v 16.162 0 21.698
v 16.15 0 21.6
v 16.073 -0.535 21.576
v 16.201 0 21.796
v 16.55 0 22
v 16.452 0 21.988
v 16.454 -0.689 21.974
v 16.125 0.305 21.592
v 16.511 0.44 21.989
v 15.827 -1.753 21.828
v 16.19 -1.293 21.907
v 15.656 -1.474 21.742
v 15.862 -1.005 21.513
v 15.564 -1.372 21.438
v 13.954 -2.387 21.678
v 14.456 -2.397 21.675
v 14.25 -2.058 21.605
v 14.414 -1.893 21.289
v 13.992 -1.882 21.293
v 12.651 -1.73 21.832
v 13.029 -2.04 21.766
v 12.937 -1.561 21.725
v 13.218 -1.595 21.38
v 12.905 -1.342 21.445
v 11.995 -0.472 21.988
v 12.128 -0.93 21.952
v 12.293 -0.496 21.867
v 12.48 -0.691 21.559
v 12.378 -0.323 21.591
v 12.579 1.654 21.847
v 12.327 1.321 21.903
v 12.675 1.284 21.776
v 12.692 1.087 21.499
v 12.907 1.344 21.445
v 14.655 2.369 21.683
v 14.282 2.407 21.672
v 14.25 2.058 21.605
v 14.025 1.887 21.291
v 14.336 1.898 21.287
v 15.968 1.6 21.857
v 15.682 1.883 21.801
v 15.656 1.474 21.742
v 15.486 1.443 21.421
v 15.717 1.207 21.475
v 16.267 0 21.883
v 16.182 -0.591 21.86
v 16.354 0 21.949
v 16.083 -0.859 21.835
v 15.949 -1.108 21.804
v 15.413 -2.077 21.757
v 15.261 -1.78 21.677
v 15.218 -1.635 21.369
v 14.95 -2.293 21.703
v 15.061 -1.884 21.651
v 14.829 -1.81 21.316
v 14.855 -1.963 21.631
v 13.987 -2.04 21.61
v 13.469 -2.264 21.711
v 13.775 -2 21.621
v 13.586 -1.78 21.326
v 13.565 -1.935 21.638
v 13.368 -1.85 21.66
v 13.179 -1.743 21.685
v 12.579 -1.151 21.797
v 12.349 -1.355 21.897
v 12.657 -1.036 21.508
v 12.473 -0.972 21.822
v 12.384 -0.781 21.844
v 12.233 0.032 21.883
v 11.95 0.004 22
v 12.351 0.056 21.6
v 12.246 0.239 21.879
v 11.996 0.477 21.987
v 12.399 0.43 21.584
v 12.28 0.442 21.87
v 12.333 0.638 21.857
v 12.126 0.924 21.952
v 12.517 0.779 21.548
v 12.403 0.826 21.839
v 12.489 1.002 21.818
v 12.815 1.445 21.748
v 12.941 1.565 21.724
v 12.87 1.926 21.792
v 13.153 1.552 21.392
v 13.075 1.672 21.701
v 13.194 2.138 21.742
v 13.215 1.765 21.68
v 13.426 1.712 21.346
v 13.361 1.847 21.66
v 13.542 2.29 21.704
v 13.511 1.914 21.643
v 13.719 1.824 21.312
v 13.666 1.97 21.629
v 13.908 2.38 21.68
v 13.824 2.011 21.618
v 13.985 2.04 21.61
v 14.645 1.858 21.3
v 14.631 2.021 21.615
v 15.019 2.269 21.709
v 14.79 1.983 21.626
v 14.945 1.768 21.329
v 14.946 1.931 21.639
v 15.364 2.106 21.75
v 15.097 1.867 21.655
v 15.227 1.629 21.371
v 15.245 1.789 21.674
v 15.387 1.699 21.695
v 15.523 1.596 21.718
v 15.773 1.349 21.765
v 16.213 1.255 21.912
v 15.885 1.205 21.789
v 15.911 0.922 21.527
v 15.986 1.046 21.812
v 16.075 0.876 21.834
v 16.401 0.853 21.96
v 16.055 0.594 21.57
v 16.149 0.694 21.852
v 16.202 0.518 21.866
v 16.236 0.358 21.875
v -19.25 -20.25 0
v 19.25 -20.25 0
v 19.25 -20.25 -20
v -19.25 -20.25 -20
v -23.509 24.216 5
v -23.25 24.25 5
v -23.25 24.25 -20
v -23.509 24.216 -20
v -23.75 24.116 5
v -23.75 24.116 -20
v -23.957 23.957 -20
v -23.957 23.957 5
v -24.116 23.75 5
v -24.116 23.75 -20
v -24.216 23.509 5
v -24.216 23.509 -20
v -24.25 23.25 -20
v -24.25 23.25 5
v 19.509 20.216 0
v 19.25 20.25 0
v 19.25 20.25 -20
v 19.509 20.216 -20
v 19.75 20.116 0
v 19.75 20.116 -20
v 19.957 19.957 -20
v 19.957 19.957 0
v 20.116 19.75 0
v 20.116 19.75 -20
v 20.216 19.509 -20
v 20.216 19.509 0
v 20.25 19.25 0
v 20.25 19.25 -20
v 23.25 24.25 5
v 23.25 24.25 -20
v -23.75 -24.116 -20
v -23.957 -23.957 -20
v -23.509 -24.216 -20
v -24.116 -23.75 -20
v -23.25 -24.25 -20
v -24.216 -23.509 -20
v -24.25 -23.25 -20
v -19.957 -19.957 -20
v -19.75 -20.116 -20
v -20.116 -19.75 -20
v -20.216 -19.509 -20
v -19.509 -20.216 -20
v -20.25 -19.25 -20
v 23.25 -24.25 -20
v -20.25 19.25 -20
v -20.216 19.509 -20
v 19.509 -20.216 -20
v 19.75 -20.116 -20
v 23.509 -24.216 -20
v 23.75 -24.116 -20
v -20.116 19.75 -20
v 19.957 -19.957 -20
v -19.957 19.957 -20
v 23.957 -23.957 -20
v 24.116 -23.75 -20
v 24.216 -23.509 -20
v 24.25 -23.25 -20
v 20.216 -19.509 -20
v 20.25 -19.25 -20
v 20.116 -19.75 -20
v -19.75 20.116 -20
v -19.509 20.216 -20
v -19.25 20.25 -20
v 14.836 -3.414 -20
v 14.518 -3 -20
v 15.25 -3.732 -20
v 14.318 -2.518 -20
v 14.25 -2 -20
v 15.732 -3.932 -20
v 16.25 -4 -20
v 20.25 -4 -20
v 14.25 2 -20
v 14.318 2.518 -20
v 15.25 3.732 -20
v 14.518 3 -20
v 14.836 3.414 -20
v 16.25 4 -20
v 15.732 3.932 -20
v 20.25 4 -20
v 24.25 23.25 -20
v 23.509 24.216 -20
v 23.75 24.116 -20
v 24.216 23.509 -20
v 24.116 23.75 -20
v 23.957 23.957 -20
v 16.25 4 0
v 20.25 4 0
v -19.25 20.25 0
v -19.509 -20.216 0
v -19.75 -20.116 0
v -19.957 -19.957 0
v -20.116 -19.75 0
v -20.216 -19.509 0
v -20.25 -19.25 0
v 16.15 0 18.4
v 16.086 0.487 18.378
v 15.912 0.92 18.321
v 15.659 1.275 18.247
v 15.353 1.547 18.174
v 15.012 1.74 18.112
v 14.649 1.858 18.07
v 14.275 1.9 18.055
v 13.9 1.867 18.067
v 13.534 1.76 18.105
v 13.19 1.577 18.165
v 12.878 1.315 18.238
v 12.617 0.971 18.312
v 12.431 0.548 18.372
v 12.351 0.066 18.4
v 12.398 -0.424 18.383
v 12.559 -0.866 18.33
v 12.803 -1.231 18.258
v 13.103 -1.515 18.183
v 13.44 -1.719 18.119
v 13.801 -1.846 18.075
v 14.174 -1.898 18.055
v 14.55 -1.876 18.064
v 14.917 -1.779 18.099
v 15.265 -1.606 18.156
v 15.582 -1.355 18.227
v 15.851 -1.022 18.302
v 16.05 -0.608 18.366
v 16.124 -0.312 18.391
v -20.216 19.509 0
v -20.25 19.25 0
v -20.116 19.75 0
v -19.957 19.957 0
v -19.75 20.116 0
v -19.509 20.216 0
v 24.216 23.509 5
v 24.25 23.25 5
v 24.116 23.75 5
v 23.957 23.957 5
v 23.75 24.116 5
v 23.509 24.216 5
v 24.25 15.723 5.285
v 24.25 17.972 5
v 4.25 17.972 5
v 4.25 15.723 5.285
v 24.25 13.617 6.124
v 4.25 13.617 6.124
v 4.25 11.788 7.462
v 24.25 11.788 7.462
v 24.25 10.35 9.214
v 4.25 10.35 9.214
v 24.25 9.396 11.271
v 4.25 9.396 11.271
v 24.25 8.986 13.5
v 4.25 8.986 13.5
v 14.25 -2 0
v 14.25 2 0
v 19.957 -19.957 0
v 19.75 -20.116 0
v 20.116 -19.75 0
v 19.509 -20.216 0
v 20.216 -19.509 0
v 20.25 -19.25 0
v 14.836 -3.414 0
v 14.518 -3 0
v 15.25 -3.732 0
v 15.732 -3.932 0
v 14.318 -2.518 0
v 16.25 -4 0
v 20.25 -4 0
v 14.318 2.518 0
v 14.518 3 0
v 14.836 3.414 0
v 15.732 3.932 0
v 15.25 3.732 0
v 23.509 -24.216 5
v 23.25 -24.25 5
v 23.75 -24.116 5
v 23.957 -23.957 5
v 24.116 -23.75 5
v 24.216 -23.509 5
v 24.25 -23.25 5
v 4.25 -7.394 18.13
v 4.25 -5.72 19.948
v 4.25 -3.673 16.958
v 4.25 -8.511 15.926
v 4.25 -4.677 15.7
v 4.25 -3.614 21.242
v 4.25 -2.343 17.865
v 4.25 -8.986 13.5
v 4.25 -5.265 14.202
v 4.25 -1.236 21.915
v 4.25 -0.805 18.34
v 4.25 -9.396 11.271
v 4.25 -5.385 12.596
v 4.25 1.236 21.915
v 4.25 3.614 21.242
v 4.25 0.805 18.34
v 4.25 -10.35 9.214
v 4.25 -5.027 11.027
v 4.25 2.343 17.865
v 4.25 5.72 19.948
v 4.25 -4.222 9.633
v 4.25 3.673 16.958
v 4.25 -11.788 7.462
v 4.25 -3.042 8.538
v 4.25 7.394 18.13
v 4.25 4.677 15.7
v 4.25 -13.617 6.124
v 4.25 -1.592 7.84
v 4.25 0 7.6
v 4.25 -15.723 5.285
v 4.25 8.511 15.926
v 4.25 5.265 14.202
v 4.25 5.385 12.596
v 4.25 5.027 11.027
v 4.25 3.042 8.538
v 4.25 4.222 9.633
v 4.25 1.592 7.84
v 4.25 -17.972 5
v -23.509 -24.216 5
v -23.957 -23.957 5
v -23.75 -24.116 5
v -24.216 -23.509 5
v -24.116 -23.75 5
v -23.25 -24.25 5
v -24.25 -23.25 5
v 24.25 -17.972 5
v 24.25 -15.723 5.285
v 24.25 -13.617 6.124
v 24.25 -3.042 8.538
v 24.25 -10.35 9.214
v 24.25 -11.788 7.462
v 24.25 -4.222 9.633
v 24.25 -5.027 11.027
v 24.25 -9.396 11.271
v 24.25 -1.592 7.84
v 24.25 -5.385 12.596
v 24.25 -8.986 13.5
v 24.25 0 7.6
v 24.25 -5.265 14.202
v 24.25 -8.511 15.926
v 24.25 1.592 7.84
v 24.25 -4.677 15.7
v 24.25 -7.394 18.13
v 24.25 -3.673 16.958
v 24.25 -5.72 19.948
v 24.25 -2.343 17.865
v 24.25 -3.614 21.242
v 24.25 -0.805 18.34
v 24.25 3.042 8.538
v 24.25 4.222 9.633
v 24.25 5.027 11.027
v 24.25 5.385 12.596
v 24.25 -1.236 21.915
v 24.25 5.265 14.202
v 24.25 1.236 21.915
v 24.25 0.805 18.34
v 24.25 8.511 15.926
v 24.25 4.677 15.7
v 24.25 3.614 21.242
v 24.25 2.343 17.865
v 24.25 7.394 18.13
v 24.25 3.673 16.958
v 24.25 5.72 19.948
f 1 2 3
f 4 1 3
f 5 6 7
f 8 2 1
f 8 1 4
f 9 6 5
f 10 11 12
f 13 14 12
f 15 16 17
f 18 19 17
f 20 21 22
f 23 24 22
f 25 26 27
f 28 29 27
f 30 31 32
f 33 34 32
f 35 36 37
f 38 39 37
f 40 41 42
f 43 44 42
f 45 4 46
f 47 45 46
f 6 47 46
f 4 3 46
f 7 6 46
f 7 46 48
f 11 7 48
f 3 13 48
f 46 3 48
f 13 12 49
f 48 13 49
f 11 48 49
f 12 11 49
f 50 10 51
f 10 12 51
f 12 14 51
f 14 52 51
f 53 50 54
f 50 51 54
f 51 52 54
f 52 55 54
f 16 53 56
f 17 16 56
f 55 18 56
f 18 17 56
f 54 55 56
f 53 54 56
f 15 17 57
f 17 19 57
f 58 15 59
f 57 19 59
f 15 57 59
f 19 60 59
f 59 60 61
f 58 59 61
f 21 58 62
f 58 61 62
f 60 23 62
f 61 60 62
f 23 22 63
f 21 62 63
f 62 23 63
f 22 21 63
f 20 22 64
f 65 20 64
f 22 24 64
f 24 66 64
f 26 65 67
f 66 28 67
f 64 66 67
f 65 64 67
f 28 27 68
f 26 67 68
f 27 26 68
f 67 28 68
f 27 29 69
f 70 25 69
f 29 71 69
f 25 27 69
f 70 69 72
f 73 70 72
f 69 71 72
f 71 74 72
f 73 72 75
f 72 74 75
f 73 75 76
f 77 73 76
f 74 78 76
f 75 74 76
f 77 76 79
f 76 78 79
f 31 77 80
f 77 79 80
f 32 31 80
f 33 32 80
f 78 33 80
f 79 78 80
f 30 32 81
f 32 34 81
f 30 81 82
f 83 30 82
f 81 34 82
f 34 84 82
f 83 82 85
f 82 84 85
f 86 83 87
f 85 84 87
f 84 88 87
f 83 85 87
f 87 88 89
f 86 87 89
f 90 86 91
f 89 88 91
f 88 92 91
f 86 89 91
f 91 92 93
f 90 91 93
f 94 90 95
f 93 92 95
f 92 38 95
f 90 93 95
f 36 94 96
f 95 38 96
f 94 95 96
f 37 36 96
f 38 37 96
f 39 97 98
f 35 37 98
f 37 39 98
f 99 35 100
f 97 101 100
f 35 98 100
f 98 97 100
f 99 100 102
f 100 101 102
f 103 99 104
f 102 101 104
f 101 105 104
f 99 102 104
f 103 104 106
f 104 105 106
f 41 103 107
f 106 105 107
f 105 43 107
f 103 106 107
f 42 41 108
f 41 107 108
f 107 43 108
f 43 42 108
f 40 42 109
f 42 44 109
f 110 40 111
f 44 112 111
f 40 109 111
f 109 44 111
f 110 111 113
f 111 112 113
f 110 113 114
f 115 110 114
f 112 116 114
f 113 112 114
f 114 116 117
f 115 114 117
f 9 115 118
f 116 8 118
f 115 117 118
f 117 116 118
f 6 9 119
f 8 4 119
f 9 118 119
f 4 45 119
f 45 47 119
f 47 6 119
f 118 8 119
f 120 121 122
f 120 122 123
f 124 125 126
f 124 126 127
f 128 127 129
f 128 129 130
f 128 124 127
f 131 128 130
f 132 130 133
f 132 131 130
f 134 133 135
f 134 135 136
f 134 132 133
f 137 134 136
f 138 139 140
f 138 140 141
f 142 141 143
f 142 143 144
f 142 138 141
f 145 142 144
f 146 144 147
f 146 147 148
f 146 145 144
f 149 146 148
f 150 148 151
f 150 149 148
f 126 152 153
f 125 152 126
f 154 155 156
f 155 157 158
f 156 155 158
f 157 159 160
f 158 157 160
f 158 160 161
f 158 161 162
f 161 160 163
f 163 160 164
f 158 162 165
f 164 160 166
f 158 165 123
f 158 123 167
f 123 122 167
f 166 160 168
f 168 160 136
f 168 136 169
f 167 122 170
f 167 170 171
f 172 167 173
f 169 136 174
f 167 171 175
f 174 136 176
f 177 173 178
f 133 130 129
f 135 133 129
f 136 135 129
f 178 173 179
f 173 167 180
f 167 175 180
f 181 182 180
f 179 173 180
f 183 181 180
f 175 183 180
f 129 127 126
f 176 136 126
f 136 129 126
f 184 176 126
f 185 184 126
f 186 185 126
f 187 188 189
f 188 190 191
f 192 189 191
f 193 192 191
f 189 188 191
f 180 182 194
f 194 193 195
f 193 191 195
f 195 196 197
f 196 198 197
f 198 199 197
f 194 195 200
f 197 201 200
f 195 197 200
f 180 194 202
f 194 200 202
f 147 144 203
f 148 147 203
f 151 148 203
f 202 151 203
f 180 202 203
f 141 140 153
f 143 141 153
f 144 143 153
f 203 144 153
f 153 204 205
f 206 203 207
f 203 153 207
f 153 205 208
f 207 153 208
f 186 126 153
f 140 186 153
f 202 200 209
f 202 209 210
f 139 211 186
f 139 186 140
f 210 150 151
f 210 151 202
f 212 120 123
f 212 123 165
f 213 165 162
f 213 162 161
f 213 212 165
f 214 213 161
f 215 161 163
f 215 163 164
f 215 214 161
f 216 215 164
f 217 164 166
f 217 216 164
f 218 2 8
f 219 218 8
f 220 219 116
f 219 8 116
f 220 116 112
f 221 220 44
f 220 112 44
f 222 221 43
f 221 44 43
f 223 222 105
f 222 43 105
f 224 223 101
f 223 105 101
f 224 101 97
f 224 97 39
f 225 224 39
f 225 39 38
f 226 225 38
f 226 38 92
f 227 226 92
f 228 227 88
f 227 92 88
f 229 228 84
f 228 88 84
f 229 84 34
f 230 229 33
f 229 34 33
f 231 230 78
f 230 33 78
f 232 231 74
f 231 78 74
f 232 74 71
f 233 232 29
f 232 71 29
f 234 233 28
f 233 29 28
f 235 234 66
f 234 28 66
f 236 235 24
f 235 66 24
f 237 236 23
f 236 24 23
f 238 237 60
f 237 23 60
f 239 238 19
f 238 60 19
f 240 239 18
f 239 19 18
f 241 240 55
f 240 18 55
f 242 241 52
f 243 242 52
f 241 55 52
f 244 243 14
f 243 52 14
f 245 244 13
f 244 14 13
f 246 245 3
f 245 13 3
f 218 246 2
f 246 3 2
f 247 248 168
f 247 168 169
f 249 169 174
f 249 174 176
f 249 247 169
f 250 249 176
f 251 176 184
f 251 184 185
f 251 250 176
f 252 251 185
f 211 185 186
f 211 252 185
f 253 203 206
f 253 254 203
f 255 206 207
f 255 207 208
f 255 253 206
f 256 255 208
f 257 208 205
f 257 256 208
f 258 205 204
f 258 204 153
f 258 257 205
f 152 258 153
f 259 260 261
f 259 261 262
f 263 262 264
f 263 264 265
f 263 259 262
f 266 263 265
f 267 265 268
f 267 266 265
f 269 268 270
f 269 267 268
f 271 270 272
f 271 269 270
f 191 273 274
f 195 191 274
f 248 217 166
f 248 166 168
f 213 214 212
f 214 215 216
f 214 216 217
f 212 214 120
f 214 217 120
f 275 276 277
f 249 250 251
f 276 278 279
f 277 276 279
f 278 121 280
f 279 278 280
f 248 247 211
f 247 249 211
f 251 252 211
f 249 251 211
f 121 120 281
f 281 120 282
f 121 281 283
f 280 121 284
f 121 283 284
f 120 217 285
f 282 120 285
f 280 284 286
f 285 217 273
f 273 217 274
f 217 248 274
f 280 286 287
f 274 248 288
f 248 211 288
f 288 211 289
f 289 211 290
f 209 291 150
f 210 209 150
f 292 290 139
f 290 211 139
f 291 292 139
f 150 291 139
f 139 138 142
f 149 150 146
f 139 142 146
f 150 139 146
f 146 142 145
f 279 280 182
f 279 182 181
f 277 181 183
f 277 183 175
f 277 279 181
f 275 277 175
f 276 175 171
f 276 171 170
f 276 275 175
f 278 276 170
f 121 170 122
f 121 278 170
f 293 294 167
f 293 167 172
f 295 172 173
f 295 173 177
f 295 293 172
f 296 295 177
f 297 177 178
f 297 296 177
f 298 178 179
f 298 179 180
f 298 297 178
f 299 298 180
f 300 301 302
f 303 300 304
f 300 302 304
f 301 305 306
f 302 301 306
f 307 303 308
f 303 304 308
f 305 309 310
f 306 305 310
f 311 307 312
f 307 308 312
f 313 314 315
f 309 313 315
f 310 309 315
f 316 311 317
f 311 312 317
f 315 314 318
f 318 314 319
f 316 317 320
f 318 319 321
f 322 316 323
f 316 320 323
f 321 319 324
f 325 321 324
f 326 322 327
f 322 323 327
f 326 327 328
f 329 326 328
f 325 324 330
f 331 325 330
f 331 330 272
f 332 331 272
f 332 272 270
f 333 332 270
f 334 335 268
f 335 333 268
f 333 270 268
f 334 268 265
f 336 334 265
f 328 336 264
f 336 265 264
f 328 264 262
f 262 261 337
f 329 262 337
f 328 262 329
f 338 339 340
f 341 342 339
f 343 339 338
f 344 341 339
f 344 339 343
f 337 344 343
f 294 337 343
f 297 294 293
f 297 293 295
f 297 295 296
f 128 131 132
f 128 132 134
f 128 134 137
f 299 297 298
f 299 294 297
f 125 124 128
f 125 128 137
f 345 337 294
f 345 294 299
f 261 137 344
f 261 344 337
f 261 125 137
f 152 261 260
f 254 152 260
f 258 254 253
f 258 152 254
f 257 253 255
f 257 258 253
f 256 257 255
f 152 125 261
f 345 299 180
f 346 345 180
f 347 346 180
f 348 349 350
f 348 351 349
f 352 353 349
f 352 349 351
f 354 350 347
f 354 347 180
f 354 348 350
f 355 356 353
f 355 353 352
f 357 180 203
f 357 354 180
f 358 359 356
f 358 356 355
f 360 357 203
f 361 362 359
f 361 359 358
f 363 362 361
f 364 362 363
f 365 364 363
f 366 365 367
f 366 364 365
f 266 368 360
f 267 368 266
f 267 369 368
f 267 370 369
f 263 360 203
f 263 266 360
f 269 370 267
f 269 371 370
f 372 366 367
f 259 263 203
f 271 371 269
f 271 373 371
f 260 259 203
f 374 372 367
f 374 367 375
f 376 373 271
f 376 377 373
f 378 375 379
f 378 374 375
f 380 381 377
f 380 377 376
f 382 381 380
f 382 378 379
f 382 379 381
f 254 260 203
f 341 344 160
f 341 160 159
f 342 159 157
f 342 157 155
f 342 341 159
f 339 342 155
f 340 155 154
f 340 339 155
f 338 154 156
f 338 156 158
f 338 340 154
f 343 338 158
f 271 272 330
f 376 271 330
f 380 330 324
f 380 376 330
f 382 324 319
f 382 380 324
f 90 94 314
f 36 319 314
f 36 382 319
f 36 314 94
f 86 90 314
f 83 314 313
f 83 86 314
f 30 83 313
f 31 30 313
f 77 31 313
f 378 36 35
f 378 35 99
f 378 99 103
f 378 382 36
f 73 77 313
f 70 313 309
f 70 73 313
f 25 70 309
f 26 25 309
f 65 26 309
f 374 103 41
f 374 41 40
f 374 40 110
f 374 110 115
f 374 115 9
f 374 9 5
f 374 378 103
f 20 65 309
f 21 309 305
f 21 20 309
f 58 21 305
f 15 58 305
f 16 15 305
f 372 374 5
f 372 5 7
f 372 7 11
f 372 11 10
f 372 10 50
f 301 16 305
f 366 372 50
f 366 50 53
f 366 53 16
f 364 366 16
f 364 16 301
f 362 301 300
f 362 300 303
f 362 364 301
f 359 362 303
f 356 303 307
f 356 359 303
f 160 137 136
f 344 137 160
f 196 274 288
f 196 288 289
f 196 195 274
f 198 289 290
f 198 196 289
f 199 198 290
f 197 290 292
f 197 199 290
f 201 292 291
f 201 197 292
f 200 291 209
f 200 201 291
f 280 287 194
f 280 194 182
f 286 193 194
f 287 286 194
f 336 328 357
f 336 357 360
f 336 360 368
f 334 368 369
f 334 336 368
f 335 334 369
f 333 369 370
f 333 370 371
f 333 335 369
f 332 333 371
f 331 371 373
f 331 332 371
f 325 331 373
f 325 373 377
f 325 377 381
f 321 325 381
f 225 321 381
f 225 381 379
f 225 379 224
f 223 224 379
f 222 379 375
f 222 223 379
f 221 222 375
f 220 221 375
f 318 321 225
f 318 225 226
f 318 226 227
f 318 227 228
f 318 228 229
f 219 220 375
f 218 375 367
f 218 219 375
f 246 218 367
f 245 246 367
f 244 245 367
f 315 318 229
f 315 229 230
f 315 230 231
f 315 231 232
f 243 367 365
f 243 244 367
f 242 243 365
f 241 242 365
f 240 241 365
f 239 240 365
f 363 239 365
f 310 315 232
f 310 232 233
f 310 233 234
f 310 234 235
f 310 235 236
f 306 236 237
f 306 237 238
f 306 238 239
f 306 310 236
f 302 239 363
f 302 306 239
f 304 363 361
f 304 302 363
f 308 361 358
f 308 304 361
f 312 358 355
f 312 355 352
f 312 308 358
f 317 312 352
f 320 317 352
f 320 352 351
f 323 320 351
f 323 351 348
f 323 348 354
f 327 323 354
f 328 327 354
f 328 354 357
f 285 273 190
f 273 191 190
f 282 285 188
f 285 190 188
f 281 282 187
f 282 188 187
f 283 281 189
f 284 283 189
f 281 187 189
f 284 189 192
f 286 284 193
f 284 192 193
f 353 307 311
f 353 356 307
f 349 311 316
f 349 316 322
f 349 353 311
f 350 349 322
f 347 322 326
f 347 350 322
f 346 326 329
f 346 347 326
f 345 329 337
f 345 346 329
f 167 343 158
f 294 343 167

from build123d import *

# Parameters (mm, degrees)
BOSS_EXTRUDE1_DEPTH = 5
SKETCH3_R           = 5.4
BOSS_EXTRUDE2_DEPTH = 10
BOSS_EXTRUDE3_START = -20
BOSS_EXTRUDE3_DEPTH = 20
FILLET1_R           = 2
SKETCH4_R           = 1.9
CUT_EXTRUDE1_DEPTH  = 10
FILLET2_R           = 0.4


with BuildPart() as part:
    # Sketch2 → Boss-Extrude1 (new body)
    with BuildSketch(Plane.XY):
        with BuildLine():
            Line((23.25, 24.25), (-23.25, 24.25))
            ThreePointArc((-23.25, 24.25), (-23.957106781, 23.957106781), (-24.25, 23.25))
            Line((-24.25, 23.25), (-24.25, -23.25))
            ThreePointArc((-24.25, -23.25), (-23.957106781, -23.957106781), (-23.25, -24.25))
            Line((-23.25, -24.25), (23.25, -24.25))
            ThreePointArc((23.25, -24.25), (23.957106781, -23.957106781), (24.25, -23.25))
            Line((24.25, -23.25), (24.25, 23.25))
            ThreePointArc((24.25, 23.25), (23.957106781, 23.957106781), (23.25, 24.25))
        make_face()
    extrude(amount=BOSS_EXTRUDE1_DEPTH)

    # Sketch3 → Boss-Extrude2 (add, symmetric)
    with BuildSketch(Plane(origin=(14.25, 0, 0), x_dir=(0, 0, -1), z_dir=(1, 0, 0))):
        with BuildLine():
            Line((-5, -17.972200756), (-5, 17.972200756))
            ThreePointArc((-5, 17.972200756), (-7.461651585, 11.787542317), (-13.5, 8.986100378))
            ThreePointArc((-13.5, 8.986100378), (-22, 0), (-13.5, -8.986100378))
            ThreePointArc((-13.5, -8.986100378), (-7.461651585, -11.787542317), (-5, -17.972200756))
        make_face()
        with Locations((-13, 0)):
            Circle(SKETCH3_R, mode=Mode.SUBTRACT)
    extrude(amount=BOSS_EXTRUDE2_DEPTH, both=True)

    # Sketch2<3> → Boss-Extrude3 (add)
    with BuildSketch(Plane.XY.offset(BOSS_EXTRUDE3_START)):
        with BuildLine():
            Line((23.25, 24.25), (-23.25, 24.25))
            ThreePointArc((-23.25, 24.25), (-23.957106781, 23.957106781), (-24.25, 23.25))
            Line((-24.25, 23.25), (-24.25, -23.25))
            ThreePointArc((-24.25, -23.25), (-23.957106781, -23.957106781), (-23.25, -24.25))
            Line((-23.25, -24.25), (23.25, -24.25))
            ThreePointArc((23.25, -24.25), (23.957106781, -23.957106781), (24.25, -23.25))
            Line((24.25, -23.25), (24.25, 23.25))
            ThreePointArc((24.25, 23.25), (23.957106781, 23.957106781), (23.25, 24.25))
        make_face()
        with BuildLine():
            Line((20.25, 19.25), (20.25, 4))
            Line((20.25, 4), (14.25, 4))
            Line((14.25, 4), (14.25, -4))
            Line((14.25, -4), (20.25, -4))
            Line((20.25, -4), (20.25, -19.25))
            ThreePointArc((20.25, -19.25), (19.957106781, -19.957106781), (19.25, -20.25))
            Line((19.25, -20.25), (-19.25, -20.25))
            ThreePointArc((-19.25, -20.25), (-19.957106781, -19.957106781), (-20.25, -19.25))
            Line((-20.25, -19.25), (-20.25, 19.25))
            ThreePointArc((-20.25, 19.25), (-19.957106781, 19.957106781), (-19.25, 20.25))
            Line((-19.25, 20.25), (19.25, 20.25))
            ThreePointArc((19.25, 20.25), (19.957106781, 19.957106781), (20.25, 19.25))
        make_face(mode=Mode.SUBTRACT)
    extrude(amount=BOSS_EXTRUDE3_DEPTH)

    # Fillet1
    fillet1_edges = [part.edges().sort_by_distance(p)[0] for p in [
        (14.25, -4, -10),
        (14.25, 4, -10),
    ]]
    fillet(fillet1_edges, radius=FILLET1_R)

    # Sketch4 → Cut-Extrude1 (cut)
    with BuildSketch(Plane.XY.offset(22)):
        with Locations((14.25, 0)):
            Circle(SKETCH4_R)
    extrude(amount=-CUT_EXTRUDE1_DEPTH, mode=Mode.SUBTRACT)

    # Fillet2
    fillet2_edges = [part.edges().sort_by_distance(p)[0] for p in [
        (12.349999989, 0, 21.999999997),
    ]]
    fillet(fillet2_edges, radius=FILLET2_R)


solid = part.part
